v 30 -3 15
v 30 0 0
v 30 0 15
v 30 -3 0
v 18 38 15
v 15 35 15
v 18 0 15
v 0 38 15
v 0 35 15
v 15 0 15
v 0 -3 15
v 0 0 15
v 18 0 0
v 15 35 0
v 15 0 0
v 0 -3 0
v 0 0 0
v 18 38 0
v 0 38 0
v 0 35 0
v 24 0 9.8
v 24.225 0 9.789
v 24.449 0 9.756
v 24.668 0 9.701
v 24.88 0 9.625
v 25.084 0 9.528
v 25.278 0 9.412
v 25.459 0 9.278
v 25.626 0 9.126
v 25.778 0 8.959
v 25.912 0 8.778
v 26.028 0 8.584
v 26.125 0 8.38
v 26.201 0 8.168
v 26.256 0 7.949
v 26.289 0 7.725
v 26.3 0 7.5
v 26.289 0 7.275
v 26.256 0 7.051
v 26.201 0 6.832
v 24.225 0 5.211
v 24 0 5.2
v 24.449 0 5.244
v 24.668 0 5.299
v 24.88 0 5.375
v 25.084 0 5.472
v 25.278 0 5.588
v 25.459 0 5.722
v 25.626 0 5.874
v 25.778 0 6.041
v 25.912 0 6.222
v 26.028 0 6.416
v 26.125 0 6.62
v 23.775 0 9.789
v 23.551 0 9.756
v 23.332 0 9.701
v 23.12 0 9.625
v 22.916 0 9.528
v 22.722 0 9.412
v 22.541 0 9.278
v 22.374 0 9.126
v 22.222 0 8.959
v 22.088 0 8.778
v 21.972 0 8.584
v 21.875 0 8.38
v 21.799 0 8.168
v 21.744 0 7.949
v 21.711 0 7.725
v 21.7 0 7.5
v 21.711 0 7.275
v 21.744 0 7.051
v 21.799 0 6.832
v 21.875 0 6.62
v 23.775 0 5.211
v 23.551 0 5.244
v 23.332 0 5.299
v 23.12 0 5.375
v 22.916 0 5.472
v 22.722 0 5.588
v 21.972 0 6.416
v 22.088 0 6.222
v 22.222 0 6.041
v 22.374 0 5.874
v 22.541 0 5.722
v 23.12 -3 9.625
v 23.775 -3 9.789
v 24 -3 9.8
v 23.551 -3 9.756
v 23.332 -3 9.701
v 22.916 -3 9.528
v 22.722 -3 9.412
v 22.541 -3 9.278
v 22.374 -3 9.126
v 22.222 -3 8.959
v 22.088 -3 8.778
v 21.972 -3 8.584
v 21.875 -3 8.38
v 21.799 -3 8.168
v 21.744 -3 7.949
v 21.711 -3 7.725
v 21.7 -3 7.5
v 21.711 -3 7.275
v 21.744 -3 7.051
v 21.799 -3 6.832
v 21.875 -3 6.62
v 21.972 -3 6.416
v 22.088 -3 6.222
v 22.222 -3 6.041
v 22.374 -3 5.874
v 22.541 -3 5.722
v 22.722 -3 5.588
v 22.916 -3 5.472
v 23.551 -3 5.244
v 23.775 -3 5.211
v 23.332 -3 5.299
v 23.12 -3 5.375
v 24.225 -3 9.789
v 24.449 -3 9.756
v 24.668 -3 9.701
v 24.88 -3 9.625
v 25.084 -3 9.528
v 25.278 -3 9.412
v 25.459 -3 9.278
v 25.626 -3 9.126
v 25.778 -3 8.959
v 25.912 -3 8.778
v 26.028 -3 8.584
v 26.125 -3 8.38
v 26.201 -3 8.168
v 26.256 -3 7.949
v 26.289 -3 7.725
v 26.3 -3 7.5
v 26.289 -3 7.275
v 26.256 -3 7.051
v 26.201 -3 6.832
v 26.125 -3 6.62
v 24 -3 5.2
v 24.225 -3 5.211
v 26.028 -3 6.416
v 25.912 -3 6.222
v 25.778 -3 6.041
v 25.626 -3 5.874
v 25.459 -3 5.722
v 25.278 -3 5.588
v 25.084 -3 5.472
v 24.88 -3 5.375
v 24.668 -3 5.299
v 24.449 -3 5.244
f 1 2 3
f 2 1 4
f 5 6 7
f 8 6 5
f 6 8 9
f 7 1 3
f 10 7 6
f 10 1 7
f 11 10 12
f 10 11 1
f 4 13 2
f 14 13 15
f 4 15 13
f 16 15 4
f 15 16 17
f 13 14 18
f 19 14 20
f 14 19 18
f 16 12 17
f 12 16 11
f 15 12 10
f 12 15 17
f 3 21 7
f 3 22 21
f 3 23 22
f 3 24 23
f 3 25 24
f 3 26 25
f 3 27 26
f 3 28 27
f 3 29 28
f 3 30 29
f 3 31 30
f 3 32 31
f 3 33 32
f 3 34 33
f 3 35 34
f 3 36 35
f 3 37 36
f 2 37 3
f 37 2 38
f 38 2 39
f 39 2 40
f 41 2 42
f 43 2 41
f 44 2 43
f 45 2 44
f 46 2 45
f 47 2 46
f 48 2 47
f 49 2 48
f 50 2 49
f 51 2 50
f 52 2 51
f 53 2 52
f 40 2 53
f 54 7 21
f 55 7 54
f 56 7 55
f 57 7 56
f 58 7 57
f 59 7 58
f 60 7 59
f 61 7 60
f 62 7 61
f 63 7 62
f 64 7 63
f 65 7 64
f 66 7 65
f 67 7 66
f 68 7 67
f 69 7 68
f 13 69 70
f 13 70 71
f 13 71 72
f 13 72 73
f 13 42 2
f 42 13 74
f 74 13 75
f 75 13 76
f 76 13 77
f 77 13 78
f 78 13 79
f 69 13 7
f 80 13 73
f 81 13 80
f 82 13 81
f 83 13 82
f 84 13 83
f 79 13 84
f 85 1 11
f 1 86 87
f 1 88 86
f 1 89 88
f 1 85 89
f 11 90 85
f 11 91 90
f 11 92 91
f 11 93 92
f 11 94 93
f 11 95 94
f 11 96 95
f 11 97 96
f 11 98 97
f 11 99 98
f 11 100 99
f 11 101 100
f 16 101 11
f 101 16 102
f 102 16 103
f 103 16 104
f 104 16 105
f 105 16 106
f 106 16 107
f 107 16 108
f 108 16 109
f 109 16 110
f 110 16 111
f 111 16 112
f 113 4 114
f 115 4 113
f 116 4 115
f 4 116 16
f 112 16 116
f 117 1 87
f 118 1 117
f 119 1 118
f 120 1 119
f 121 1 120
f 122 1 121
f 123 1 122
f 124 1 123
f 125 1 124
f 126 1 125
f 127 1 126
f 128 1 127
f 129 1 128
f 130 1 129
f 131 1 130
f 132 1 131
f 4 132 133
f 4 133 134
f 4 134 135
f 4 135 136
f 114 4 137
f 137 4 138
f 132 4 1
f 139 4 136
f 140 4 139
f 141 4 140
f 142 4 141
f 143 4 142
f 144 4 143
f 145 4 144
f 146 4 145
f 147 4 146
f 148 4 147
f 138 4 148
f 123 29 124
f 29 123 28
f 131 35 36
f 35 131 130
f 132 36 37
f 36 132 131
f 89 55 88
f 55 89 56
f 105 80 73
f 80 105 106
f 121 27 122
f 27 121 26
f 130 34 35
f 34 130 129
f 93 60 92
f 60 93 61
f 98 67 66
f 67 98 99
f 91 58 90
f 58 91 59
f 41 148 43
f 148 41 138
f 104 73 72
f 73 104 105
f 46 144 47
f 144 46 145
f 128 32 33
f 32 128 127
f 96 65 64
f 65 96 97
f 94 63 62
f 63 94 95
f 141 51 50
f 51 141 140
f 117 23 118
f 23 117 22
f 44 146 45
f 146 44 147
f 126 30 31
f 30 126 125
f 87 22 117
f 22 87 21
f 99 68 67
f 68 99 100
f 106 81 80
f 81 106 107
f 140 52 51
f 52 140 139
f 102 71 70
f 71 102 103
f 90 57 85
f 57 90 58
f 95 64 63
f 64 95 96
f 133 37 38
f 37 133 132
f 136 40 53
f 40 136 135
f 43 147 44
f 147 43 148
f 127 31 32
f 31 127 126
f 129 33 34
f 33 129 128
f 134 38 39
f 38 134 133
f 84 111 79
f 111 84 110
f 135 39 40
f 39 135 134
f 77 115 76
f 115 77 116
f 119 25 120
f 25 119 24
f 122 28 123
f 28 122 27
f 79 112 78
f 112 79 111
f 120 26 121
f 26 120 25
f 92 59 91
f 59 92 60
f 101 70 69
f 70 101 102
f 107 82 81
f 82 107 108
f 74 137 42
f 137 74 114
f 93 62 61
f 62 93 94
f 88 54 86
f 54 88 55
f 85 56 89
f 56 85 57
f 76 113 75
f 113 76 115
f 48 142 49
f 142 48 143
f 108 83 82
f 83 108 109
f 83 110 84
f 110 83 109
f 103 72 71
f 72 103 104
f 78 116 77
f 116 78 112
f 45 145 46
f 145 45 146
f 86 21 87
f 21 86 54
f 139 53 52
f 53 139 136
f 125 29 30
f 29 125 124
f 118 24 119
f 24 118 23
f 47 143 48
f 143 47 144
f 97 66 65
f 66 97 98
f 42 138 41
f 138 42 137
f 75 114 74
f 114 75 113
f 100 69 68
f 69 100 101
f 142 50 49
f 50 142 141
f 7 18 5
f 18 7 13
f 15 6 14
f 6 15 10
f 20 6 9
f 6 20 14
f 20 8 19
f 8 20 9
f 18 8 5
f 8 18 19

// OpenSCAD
opening   = 35.0;  // Width of opening where PC sits
thickness =  3.0;  // Thickness of part
width     = 15.0;  // Width of part
depth     = 15.0;  // Depth of seating pocket
hole_dia  =  4.6;  // #8 screw hole

//
//
//
translate ([0, -thickness, 0]) {
  //
  //  Top bar
  //
  translate ([depth, 0, 0])
    cube ([thickness, opening + thickness, width]);

  //
  //  Middle bar
  //
  translate ([0, opening + thickness, 0])
    cube ([depth + thickness, thickness, width]);

  //
  //  Bottom bar
  //
  hole_x_pos = (depth + thickness) + (((depth * 2) - (depth + thickness)) / 2);
  
  difference () {
    cube ([depth * 2, thickness, width]);
    translate ([hole_x_pos, thickness / 2, width / 2])
      rotate ([90, 0, 0])
        cylinder (h=thickness + 0.02, d=hole_dia, $fn=64, center=true);
  };
}
